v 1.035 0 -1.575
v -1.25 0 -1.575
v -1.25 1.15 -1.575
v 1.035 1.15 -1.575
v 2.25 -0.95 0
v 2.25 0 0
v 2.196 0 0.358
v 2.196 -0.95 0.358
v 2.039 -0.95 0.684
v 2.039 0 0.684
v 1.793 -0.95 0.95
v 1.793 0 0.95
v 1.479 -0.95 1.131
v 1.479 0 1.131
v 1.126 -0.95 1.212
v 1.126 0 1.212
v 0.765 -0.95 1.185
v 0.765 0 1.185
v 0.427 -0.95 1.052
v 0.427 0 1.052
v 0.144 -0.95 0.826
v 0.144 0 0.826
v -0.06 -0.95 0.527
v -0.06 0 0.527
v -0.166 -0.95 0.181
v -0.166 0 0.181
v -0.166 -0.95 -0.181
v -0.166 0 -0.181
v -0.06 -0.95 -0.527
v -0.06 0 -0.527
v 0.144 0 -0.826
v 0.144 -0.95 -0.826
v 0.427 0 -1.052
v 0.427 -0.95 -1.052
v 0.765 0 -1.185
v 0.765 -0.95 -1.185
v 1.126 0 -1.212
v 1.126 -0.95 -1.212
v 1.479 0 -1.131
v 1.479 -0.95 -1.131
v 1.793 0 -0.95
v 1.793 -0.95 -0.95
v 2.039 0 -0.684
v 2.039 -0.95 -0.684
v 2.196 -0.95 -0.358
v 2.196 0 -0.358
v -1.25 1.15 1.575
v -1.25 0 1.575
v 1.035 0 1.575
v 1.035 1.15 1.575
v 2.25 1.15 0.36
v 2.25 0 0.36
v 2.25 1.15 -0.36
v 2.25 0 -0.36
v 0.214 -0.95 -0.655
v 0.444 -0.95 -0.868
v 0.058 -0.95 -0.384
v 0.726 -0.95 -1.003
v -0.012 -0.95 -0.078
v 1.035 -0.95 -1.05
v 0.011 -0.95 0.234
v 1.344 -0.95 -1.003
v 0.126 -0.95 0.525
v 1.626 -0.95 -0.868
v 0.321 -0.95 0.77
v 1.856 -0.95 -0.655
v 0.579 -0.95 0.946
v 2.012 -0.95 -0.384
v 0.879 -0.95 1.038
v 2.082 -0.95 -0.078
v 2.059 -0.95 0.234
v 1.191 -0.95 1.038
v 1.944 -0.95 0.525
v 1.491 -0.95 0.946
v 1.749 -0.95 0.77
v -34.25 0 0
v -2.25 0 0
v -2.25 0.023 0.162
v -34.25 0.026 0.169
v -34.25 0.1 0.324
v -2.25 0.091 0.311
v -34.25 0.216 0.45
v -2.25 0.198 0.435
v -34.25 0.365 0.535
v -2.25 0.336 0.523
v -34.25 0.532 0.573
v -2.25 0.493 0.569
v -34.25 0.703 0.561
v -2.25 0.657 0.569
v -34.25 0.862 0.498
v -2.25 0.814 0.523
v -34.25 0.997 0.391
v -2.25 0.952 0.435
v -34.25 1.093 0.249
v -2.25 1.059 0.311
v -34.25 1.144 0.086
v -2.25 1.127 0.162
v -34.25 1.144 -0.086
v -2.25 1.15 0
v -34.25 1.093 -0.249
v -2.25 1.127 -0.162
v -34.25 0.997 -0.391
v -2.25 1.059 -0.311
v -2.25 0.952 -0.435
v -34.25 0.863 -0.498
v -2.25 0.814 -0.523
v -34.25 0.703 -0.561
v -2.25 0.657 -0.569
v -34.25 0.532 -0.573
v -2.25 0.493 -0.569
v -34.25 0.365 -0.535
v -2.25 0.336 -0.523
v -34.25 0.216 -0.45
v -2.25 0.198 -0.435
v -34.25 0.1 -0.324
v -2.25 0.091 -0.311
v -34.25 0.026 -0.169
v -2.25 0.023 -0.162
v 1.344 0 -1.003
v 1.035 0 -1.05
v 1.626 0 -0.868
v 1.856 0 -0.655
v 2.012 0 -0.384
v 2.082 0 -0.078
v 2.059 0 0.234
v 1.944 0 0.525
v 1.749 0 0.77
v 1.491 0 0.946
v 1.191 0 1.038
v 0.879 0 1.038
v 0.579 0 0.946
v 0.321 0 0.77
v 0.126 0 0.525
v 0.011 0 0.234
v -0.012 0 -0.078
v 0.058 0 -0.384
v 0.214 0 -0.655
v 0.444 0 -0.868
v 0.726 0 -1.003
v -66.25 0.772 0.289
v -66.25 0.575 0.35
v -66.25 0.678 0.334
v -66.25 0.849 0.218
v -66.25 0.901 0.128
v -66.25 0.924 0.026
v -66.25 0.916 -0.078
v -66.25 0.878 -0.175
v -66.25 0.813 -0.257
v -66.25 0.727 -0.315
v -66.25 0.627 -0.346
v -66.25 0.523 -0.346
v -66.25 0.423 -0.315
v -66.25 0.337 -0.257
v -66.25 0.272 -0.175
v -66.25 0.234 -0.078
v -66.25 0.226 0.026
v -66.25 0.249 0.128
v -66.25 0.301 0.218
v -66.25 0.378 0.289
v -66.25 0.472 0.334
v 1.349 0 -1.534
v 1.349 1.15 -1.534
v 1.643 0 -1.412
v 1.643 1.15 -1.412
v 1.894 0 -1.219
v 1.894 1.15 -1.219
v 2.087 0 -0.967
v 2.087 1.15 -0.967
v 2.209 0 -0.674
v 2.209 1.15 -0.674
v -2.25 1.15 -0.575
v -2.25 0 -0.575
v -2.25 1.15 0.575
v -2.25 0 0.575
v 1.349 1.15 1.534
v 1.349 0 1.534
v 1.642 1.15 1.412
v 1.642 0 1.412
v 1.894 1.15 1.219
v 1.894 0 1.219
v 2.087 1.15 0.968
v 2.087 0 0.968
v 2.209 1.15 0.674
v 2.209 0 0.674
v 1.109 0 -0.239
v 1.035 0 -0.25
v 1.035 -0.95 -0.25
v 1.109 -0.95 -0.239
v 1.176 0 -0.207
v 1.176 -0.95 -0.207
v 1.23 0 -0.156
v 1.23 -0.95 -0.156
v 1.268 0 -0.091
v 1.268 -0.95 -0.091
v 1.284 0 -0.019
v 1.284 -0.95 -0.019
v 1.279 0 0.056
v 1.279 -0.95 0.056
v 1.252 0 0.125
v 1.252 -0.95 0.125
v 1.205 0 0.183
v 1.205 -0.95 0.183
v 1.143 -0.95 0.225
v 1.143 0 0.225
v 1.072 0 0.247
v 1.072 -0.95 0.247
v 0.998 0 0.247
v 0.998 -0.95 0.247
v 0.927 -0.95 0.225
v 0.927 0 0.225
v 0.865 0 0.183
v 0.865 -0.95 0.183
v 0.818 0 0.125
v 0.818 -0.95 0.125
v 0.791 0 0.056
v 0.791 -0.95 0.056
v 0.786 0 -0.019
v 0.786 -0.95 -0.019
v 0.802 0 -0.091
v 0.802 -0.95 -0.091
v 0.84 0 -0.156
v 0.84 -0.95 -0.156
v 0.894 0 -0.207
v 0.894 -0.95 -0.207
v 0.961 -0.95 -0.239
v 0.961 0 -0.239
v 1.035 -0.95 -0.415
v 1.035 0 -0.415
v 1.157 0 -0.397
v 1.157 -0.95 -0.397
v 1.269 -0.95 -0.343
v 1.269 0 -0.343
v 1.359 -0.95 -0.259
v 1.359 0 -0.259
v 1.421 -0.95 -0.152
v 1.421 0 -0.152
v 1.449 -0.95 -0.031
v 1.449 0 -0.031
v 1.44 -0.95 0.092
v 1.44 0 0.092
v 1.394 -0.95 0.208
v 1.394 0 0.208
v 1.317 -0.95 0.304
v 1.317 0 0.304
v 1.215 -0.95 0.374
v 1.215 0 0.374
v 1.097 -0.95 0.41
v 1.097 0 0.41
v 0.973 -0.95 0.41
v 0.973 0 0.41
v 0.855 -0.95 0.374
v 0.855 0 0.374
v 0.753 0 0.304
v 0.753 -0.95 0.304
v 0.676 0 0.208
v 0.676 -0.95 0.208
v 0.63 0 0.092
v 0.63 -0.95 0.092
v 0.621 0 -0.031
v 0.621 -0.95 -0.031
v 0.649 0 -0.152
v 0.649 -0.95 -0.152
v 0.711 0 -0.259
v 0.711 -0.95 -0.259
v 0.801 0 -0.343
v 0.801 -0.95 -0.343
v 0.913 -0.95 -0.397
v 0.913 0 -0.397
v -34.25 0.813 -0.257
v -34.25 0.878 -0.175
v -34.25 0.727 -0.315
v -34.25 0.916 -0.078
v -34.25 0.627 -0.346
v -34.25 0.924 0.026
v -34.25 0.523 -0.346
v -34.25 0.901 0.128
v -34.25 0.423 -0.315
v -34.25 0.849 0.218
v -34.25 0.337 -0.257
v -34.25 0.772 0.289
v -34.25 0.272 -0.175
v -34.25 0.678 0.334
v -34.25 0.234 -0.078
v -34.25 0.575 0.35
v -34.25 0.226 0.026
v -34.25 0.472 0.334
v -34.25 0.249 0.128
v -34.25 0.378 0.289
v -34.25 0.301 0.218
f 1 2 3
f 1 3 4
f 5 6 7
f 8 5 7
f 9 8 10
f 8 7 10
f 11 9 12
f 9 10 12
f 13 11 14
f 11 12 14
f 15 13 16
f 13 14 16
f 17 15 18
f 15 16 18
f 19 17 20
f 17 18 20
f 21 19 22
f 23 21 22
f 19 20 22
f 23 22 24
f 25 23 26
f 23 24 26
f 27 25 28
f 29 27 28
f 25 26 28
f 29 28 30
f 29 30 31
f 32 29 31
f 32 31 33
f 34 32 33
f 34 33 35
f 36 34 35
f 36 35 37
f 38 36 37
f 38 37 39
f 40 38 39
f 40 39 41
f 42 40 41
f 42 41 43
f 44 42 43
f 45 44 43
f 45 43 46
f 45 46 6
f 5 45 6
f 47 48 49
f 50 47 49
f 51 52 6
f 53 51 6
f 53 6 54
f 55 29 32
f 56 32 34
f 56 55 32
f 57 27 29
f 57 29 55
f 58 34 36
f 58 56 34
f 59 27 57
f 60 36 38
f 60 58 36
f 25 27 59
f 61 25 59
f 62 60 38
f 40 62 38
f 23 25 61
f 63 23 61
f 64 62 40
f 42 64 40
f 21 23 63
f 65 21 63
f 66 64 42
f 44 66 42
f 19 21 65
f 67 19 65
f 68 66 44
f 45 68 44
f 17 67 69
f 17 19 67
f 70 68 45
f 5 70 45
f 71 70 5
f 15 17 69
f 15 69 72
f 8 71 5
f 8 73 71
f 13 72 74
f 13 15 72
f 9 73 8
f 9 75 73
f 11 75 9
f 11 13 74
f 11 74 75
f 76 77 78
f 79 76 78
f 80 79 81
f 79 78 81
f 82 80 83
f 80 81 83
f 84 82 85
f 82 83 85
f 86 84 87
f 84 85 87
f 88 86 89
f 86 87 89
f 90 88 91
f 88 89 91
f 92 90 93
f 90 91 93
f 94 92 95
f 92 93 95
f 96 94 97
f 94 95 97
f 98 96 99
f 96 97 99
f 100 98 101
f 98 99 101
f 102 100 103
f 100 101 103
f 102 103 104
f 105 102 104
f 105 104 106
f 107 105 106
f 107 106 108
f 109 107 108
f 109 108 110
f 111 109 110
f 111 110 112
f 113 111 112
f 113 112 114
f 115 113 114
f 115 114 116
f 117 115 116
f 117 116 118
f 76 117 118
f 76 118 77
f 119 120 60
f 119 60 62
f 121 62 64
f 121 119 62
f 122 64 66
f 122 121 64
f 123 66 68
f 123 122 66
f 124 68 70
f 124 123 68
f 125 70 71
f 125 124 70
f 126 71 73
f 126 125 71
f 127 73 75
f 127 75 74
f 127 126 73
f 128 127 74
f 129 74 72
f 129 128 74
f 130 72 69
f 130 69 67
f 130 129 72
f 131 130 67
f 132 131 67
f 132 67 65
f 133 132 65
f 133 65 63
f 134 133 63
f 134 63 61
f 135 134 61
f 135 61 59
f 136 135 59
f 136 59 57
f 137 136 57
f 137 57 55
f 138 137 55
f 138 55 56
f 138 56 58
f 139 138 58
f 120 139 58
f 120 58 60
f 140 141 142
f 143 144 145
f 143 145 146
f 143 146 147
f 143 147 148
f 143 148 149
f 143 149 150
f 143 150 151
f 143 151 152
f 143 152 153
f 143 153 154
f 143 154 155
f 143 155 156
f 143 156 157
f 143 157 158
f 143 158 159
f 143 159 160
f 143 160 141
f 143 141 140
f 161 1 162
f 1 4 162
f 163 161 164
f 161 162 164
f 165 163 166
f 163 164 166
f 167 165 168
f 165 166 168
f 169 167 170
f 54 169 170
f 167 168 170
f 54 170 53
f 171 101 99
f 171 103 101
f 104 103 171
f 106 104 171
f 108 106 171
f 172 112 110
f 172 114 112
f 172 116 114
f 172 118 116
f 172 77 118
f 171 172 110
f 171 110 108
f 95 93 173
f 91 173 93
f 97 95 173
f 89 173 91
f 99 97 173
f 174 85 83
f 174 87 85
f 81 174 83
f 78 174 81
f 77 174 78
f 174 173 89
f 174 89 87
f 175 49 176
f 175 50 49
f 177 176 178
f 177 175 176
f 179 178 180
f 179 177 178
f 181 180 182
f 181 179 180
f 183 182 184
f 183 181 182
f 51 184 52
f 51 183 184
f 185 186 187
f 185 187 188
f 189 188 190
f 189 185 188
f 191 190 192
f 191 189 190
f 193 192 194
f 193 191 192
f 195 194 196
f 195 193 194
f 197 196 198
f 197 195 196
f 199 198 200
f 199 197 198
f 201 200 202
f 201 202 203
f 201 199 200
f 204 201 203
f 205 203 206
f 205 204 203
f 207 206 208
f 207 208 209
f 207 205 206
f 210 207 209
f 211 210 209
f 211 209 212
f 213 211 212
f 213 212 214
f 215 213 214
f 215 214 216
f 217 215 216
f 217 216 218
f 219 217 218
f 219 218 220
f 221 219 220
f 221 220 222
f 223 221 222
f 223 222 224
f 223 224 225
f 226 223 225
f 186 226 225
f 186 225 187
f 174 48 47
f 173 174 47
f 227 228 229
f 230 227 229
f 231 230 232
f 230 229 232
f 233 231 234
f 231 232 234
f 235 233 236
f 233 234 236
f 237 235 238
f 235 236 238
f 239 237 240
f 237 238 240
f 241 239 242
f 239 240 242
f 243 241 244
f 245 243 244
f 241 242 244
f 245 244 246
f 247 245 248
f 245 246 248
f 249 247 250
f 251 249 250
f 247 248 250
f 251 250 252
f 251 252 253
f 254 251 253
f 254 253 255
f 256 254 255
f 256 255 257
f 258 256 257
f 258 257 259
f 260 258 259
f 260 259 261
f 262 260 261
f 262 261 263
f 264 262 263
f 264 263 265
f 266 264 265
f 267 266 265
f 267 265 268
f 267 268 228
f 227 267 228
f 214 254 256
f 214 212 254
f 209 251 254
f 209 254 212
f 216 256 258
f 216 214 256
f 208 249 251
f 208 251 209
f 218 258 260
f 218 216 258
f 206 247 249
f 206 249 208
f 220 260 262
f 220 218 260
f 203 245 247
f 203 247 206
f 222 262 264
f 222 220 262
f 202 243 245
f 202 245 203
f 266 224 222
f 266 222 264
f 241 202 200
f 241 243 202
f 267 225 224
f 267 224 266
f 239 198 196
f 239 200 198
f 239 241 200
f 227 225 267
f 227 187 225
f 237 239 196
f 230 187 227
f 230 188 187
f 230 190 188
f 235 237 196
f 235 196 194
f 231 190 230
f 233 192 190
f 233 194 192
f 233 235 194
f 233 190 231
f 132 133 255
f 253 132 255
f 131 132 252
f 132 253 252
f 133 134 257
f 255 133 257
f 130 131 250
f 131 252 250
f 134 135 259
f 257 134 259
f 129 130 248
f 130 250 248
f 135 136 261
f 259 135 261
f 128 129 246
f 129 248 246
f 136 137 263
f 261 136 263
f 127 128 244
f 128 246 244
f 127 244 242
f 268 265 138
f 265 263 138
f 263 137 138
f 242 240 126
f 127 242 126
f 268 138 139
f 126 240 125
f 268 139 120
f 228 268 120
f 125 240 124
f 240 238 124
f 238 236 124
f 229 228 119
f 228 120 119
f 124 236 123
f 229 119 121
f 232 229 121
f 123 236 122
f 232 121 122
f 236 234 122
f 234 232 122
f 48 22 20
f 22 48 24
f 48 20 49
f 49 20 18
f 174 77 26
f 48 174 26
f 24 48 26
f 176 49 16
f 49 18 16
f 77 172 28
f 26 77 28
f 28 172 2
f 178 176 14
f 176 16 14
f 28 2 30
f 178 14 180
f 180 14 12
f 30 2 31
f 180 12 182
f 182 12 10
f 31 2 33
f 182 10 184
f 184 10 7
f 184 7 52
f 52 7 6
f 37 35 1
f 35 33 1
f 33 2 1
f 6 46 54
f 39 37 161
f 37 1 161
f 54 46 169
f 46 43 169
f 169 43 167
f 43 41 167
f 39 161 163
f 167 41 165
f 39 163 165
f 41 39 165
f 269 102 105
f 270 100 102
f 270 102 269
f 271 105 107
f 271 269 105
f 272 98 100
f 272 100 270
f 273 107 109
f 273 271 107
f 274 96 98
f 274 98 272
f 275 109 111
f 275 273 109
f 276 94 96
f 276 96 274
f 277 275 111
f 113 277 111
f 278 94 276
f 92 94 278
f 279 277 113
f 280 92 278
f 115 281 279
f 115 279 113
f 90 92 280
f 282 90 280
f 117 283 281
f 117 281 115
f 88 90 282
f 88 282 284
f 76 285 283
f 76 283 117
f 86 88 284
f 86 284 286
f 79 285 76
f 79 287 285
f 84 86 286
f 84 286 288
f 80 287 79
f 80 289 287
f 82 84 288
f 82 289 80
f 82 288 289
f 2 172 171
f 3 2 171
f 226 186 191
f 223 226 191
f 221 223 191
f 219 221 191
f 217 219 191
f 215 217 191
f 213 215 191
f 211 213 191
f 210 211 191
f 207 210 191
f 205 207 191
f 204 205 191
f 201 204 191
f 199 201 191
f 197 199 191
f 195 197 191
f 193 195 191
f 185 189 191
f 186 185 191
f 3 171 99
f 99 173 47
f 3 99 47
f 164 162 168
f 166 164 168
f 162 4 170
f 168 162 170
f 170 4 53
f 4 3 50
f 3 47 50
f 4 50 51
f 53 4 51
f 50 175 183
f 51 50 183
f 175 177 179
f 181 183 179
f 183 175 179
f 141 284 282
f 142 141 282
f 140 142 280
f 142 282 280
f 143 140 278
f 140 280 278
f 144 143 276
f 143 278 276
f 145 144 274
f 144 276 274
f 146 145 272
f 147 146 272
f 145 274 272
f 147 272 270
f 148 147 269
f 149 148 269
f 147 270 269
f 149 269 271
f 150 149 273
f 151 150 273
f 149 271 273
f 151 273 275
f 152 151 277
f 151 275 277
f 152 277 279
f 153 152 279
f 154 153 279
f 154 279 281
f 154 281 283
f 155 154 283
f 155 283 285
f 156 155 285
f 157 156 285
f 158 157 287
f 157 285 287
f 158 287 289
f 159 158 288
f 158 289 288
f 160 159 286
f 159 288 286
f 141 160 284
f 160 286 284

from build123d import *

# Parameters (mm, degrees)
SKETCH1_W           = 4.5
SKETCH1_H           = 3.15
BOSS_EXTRUDE1_DEPTH = 1.15
BOSS_EXTRUDE2_START = -1.15
SKETCH2_R           = 1.215
SKETCH2_R_2         = 1.05
SKETCH2_R_3         = 0.415
SKETCH2_R_4         = 0.25
BOSS_EXTRUDE2_DEPTH = 2.1
SKETCH3_R           = 0.575
BOSS_EXTRUDE3_DEPTH = 32
SKETCH4_R           = 0.35
BOSS_EXTRUDE4_DEPTH = 32
FILLET1_R           = 1.215
CHAMFER2_SIZE       = 1


with BuildPart() as part:
    # Sketch1 → Boss-Extrude1 (new body)
    with BuildSketch(Plane(origin=(0, 0, 0), x_dir=(1, 0, 0), z_dir=(0, 1, 0))):
        Rectangle(SKETCH1_W, SKETCH1_H)
    extrude(amount=BOSS_EXTRUDE1_DEPTH)

    # Sketch2 → Boss-Extrude2 (add)
    # profile 1 of 2: a face of its own
    with BuildSketch(Plane.XZ.offset(BOSS_EXTRUDE2_START)):
        with Locations((1.035, 0)):
            Circle(SKETCH2_R)
        with Locations(Location((1.035, 0, 0), (0, 0, 270))):
            Circle(SKETCH2_R_2, mode=Mode.SUBTRACT)
    # profile 2 of 2: a face of its own
    with BuildSketch(Plane.XZ.offset(BOSS_EXTRUDE2_START)):
        with Locations(Location((1.035, 0, 0), (0, 0, 270))):
            Circle(SKETCH2_R_3)
        with Locations(Location((1.035, 0, 0), (0, 0, 270))):
            Circle(SKETCH2_R_4, mode=Mode.SUBTRACT)
    extrude(amount=BOSS_EXTRUDE2_DEPTH)

    # Sketch3 → Boss-Extrude3 (add)
    with BuildSketch(Plane.ZY.offset(2.25)):
        with Locations(Location((0, 0.575, 0), (0, 0, 270))):
            Circle(SKETCH3_R)
    extrude(amount=BOSS_EXTRUDE3_DEPTH)

    # Sketch4 → Boss-Extrude4 (add)
    with BuildSketch(Plane.ZY.offset(34.25)):
        with Locations((0, 0.575)):
            Circle(SKETCH4_R)
    extrude(amount=BOSS_EXTRUDE4_DEPTH)

    # Fillet1
    fillet1_edges = [part.edges().sort_by_distance(p)[0] for p in [
        (2.25, 0.575, 1.575),
        (2.25, 0.575, -1.575),
    ]]
    fillet(fillet1_edges, radius=FILLET1_R)

    # Chamfer2
    chamfer2_edges = [part.edges().sort_by_distance(p)[0] for p in [
        (-2.25, 0.575, 1.575),
        (-2.25, 0.575, -1.575),
    ]]
    chamfer(chamfer2_edges, length=CHAMFER2_SIZE - 0.0001)  # a hair under: the kernel refuses the full size


solid = part.part
